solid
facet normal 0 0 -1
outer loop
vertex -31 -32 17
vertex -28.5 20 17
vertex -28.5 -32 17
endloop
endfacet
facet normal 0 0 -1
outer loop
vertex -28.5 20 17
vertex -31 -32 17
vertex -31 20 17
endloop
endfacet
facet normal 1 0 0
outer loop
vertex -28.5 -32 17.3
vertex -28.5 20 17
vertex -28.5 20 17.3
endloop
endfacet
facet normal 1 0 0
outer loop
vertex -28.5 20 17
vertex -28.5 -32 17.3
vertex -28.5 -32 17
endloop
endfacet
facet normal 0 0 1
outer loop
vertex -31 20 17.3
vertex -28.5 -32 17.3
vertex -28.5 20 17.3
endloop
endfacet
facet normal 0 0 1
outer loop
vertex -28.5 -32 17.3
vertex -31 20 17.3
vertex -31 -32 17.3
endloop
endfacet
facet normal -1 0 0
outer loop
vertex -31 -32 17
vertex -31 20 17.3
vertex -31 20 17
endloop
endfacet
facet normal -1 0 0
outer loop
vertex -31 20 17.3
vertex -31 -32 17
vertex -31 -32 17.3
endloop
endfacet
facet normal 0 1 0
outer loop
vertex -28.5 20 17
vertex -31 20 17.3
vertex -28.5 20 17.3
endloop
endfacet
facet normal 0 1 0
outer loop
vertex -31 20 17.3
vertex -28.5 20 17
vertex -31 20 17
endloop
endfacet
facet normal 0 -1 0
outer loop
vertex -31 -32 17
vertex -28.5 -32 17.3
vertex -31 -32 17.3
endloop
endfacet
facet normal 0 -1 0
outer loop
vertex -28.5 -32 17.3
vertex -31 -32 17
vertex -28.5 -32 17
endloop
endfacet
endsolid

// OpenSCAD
// The Y rack (on the Y carriage's -X face) must reach the carriage's bottom
// face so it prints without supports. Must render non-empty.
include <../axes.scad>
intersection() {
    y_carriage();
    translate([yc_x0 - 3, yc_y0 + 5, yc_z0]) cube([2.5, yc_len - 10, 0.3]);
}
